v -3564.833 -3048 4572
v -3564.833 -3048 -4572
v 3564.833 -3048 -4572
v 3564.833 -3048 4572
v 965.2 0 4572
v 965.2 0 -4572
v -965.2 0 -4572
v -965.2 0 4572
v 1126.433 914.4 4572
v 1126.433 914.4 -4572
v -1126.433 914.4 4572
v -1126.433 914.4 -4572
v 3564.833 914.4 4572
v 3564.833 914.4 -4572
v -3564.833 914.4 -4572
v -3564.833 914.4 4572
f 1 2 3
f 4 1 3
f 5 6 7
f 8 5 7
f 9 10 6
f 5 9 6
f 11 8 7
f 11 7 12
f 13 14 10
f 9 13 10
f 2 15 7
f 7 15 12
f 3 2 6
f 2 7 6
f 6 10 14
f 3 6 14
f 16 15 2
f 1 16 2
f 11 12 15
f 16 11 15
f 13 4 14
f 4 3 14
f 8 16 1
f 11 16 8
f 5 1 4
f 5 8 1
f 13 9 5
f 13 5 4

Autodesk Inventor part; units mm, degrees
ref_plane "YZ Plane" through (0, 0, 0) normal (1, 0, 0) x (0, 1, 0)
ref_plane "XZ Plane" through (0, 0, 0) normal (0, 1, 0) x (-1, 0, 0)
ref_plane "XY Plane" through (0, 0, 0) normal (0, 0, 1) x (1, 0, 0)
sketch "Sketch1" plane through (0, 0, 0) normal (0, 0, 1) x (1, 0, 0)
  line L0 (-3564.8334, 914.4) -> (-3564.8334, -3048)
  line L1 (-3564.8334, -3048) -> (3564.8334, -3048)
  line L2 (3564.8334, -3048) -> (3564.8334, 914.4)
  line L3 (3564.8334, 914.4) -> (1126.4334, 914.4)
  line L4 (1126.4334, 914.4) -> (965.2, 0)
  line L5 (965.2, 0) -> (-965.2, 0)
  line L6 (-965.2, 0) -> (-1126.4334, 914.4)
  line L7 (-1126.4334, 914.4) -> (-3564.8334, 914.4)
  point P0 (0, 0)
  point P1 (0, 0)
  dimension "d0" = 2438.4
  dimension "d1" = 1930.4
  dimension "d2" = 914.4
  dimension "d3" = 100
  dimension "d4" = 100
  dimension "d5" = 3048
extrude "Extrusion1" add sketch "Sketch1" along normal mid plane 9144
equation "\"d4\" = d3"
properties part number "FerrisWheelCarriageKGR" material "Concrete"
